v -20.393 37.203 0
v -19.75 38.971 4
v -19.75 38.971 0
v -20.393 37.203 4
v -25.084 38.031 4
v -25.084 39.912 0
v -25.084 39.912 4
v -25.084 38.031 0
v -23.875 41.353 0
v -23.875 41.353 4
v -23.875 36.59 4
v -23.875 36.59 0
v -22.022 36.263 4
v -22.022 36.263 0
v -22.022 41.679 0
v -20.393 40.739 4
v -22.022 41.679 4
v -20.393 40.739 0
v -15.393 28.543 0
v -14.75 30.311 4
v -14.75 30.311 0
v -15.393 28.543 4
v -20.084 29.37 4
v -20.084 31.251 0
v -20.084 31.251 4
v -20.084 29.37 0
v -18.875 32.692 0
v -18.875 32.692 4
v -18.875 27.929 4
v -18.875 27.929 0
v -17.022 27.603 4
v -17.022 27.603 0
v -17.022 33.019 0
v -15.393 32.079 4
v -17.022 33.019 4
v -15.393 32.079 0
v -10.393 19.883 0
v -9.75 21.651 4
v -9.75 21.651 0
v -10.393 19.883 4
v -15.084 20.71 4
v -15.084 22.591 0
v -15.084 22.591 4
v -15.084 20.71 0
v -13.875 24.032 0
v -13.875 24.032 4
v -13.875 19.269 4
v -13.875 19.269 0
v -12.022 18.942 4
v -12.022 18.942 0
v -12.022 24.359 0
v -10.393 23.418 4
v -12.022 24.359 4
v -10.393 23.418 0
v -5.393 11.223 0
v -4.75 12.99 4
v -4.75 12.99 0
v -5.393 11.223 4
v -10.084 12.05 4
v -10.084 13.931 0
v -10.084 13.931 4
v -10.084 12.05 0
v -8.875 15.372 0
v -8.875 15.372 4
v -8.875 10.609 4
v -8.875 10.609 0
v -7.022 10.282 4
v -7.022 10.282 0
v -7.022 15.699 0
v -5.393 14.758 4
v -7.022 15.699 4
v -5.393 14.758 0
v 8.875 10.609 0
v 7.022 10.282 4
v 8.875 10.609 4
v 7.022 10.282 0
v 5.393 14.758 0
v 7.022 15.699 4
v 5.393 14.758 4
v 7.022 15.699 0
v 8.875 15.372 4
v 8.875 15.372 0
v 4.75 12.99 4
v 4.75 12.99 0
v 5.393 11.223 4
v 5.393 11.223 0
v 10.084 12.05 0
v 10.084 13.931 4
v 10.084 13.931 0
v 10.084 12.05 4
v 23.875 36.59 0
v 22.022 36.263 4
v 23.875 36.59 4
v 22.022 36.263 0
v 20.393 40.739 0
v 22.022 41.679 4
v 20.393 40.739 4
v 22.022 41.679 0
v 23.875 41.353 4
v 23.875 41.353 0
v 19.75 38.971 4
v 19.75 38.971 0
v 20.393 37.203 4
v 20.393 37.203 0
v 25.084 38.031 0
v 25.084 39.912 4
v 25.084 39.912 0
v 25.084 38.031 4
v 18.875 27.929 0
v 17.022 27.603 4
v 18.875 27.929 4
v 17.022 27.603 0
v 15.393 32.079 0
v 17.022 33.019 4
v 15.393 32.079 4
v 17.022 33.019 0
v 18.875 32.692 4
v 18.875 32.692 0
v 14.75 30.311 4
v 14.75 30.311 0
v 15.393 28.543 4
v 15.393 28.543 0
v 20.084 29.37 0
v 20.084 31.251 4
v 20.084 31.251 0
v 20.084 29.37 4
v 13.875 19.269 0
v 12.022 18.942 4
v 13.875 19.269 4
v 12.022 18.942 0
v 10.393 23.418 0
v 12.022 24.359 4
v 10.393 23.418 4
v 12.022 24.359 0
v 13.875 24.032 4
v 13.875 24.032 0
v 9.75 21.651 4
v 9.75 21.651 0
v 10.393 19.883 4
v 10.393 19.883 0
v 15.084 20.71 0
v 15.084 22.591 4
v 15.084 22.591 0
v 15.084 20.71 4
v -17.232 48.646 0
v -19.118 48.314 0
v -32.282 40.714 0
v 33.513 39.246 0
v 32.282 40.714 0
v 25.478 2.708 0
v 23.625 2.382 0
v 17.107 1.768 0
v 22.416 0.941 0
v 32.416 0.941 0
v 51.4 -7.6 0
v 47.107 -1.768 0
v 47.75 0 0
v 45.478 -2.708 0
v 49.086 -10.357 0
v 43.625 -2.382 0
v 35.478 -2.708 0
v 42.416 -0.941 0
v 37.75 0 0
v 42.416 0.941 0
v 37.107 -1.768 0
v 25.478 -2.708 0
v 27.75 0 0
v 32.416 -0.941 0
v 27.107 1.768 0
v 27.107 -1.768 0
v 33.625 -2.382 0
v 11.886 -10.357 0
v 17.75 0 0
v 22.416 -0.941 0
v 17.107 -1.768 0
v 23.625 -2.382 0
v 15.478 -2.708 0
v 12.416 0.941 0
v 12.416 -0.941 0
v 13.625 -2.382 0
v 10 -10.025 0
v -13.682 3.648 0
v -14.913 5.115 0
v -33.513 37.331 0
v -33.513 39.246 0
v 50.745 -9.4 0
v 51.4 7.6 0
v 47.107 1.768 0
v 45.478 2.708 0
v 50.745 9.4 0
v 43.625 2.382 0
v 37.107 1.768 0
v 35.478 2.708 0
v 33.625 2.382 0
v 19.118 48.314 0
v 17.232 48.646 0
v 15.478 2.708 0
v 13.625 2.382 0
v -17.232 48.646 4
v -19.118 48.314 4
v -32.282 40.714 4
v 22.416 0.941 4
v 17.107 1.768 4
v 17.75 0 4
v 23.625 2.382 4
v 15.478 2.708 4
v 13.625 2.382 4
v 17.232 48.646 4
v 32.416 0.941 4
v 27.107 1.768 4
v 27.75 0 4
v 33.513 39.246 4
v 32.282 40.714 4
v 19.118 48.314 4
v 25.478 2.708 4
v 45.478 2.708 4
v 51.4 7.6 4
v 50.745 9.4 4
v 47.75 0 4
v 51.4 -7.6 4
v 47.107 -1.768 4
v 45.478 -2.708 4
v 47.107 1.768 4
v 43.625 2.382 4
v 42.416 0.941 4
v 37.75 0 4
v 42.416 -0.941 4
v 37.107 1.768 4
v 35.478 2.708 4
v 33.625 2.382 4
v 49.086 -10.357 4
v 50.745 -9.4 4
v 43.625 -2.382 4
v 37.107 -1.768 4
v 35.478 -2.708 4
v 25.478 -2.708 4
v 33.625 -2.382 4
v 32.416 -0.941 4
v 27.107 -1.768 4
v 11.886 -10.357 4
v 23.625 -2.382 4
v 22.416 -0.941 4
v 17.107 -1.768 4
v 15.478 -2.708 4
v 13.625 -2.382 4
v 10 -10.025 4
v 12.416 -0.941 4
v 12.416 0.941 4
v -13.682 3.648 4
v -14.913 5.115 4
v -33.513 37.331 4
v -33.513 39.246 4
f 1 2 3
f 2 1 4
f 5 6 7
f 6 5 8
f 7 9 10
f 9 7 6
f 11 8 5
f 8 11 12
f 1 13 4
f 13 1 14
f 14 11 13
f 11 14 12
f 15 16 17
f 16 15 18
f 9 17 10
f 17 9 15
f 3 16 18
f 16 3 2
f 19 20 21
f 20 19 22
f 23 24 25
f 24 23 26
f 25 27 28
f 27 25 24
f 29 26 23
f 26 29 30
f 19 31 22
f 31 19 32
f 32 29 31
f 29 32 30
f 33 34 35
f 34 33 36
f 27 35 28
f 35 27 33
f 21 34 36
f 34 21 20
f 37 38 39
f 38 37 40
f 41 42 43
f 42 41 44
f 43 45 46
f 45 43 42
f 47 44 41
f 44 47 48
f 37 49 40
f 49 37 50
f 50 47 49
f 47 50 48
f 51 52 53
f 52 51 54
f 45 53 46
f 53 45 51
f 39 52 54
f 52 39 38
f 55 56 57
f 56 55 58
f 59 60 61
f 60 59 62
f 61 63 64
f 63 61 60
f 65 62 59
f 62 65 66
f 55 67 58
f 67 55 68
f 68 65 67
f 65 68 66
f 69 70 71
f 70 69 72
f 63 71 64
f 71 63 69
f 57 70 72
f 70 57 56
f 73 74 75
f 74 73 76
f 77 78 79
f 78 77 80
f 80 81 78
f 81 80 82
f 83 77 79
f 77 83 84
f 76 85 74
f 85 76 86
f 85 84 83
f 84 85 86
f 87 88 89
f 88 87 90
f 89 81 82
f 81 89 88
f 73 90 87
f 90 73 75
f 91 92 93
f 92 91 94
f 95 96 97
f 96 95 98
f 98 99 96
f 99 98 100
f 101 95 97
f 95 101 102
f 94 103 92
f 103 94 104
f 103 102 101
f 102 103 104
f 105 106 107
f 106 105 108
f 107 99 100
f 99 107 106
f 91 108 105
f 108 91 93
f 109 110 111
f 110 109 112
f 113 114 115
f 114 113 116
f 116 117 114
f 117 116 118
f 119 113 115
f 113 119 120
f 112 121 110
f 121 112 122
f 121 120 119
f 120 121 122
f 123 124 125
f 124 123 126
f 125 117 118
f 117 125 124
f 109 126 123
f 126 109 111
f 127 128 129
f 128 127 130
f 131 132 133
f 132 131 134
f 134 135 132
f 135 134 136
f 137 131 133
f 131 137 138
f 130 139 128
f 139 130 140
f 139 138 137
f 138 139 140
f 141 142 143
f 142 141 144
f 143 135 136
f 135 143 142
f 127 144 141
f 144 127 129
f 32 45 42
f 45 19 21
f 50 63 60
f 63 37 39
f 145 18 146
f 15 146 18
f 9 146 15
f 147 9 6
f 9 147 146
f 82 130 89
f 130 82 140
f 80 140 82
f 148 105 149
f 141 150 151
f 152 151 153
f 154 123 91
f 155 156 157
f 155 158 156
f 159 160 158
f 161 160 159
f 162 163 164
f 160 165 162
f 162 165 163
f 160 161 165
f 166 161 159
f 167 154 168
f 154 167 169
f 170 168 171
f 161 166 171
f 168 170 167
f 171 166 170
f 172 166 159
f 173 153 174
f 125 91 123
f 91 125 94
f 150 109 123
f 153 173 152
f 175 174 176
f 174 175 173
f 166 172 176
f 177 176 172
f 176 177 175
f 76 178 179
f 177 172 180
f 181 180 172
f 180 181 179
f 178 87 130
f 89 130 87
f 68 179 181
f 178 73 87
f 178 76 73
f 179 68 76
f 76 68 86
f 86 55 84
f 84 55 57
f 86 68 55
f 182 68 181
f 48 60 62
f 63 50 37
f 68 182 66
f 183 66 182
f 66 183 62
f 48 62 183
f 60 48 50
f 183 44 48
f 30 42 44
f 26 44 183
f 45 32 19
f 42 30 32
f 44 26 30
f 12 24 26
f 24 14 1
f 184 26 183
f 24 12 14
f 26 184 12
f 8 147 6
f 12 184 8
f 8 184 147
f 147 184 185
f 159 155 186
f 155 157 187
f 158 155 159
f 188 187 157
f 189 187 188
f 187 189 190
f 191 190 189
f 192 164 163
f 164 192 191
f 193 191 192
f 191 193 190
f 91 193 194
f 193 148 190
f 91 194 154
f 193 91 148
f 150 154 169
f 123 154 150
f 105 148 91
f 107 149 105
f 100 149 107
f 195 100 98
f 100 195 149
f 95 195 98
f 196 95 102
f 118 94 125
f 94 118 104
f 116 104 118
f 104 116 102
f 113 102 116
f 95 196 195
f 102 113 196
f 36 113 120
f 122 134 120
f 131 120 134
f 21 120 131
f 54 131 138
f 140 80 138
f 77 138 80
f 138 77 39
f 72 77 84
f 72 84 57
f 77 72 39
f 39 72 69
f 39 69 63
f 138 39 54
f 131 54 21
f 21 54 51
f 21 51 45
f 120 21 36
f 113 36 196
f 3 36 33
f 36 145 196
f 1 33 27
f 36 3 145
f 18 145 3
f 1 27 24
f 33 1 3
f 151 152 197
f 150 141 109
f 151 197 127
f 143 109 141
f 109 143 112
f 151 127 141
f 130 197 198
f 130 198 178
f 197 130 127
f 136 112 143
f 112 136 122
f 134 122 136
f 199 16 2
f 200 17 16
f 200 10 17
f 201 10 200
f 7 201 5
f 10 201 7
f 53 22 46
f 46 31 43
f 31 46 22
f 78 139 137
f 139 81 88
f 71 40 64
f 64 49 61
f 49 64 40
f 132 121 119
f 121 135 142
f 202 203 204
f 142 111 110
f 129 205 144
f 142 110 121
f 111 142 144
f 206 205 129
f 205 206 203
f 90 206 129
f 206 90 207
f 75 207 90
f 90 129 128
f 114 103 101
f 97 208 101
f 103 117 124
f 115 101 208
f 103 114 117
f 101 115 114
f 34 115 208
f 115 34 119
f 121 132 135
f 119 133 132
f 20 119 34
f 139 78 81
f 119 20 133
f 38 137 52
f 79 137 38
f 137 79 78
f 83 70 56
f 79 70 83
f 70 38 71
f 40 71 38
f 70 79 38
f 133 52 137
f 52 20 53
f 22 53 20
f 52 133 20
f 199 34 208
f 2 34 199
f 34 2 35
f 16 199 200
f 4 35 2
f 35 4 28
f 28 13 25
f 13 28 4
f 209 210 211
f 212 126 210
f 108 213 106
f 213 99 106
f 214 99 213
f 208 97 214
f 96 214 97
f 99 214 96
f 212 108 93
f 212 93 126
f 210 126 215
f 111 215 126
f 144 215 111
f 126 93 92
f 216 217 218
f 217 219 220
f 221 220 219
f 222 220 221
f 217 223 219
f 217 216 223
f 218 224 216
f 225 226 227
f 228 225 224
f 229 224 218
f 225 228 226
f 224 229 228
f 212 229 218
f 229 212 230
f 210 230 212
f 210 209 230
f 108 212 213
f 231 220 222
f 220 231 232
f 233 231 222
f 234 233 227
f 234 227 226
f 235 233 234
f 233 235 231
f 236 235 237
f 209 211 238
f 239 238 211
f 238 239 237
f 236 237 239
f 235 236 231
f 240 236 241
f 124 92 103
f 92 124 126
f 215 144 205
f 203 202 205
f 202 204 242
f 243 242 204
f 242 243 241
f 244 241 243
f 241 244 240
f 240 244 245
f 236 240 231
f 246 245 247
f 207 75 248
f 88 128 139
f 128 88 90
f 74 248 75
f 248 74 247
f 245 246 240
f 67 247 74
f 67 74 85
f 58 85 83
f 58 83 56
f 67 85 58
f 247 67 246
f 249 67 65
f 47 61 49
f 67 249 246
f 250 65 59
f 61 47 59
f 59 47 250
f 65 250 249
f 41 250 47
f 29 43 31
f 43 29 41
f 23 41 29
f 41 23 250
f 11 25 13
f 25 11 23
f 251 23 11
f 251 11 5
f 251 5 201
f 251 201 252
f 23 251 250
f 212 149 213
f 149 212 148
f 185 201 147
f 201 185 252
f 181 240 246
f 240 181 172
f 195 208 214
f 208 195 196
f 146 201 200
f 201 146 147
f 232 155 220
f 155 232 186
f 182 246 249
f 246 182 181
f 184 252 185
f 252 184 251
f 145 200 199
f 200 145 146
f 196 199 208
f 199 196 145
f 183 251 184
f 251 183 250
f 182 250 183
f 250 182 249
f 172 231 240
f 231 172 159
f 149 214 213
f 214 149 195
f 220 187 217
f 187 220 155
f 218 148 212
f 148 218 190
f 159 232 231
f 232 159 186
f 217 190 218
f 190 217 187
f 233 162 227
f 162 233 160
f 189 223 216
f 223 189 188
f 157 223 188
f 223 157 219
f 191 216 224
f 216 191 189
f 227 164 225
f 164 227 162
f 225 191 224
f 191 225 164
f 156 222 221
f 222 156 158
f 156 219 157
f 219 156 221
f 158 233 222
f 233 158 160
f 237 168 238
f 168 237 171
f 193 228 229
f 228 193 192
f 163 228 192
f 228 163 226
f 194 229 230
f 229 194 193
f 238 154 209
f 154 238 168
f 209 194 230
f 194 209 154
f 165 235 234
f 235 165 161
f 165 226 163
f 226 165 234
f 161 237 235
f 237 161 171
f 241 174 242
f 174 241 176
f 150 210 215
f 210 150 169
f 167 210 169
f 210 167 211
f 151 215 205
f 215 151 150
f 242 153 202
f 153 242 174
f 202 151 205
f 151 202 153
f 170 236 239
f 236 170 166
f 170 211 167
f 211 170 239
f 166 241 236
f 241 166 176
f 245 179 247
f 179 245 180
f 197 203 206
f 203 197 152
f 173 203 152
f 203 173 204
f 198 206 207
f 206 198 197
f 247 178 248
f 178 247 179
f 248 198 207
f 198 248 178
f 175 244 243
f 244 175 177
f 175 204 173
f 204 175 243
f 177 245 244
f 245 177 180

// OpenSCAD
// rob@openpart.co.uk 20140204-03:26
// 12 hole joining plate to connect 3 off 20mm NOMINAL extrusion at 120 degrees
// V-Slot & others

module roundedRect(size, radius) {
	x = size[0];
	y = size[1];
	z = size[2];
	linear_extrude(height=z)
	hull()
	{
		// place 4 circles in the corners, with the given radius
		translate([(-x/2)+(radius/2), (-y/2)+(radius/2), 0])
		circle(r=radius);
		translate([(x/2)-(radius/2), (-y/2)+(radius/2), 0])
		circle(r=radius);
		translate([(-x/2)+(radius/2), (y/2)-(radius/2), 0])
		circle(r=radius);
		translate([(x/2)-(radius/2), (y/2)-(radius/2), 0])
		circle(r=radius);
	}
}
angle = 120;
hole = 5.5 / 2;
plate_width1 = 18;
plate_width2 = 18;
plate_width3 = 18;
plate_length1 = 40;
plate_length2 = 40;
plate_length3 = 40;
plate_thickness = 4;
extend_past_thickness = 2;
corner_radius = 2.8;

difference() {
hull () {
		rotate([0,0,(angle/2)]) {
			translate([30, 0, 0])
				roundedRect ([plate_length1, plate_width1, plate_thickness], corner_radius);
		}
		rotate([0,0,angle]) {
			translate([30, 0, 0])
				roundedRect ([plate_length3, plate_width1, plate_thickness], corner_radius);
		}

		translate([30, 0, 0])
				roundedRect ([plate_length2, plate_width2, plate_thickness], corner_radius);
		}



		rotate([0,0,angle]) {
			translate([45,00,-1])
					cylinder(h = (extend_past_thickness+plate_thickness), r = hole);
			translate([35,0,-1])
					cylinder(h = (extend_past_thickness+plate_thickness), r = hole);
			translate([25,0,-1])
					cylinder(h = (extend_past_thickness+plate_thickness), r = hole);
			translate([15,0,-1])
					cylinder(h = (extend_past_thickness+plate_thickness), r = hole);
		}

			translate([45,00,-1])
					cylinder(h = (extend_past_thickness+plate_thickness), r = hole);
			translate([35,0,-1])
					cylinder(h = (extend_past_thickness+plate_thickness), r = hole);
			translate([25,0,-1])
					cylinder(h = (extend_past_thickness+plate_thickness), r = hole);
			translate([15,0,-1])
					cylinder(h = (extend_past_thickness+plate_thickness), r = hole);

		rotate([0,0,(angle/2)]) {
			translate([15,0,-1])
					cylinder(h = (extend_past_thickness+plate_thickness), r = hole);
			translate([45,00,-1])
					cylinder(h = (extend_past_thickness+plate_thickness), r = hole);
			translate([35,0,-1])
					cylinder(h = (extend_past_thickness+plate_thickness), r = hole);
			translate([25,0,-1])
					cylinder(h = (extend_past_thickness+plate_thickness), r = hole);
		}
}
